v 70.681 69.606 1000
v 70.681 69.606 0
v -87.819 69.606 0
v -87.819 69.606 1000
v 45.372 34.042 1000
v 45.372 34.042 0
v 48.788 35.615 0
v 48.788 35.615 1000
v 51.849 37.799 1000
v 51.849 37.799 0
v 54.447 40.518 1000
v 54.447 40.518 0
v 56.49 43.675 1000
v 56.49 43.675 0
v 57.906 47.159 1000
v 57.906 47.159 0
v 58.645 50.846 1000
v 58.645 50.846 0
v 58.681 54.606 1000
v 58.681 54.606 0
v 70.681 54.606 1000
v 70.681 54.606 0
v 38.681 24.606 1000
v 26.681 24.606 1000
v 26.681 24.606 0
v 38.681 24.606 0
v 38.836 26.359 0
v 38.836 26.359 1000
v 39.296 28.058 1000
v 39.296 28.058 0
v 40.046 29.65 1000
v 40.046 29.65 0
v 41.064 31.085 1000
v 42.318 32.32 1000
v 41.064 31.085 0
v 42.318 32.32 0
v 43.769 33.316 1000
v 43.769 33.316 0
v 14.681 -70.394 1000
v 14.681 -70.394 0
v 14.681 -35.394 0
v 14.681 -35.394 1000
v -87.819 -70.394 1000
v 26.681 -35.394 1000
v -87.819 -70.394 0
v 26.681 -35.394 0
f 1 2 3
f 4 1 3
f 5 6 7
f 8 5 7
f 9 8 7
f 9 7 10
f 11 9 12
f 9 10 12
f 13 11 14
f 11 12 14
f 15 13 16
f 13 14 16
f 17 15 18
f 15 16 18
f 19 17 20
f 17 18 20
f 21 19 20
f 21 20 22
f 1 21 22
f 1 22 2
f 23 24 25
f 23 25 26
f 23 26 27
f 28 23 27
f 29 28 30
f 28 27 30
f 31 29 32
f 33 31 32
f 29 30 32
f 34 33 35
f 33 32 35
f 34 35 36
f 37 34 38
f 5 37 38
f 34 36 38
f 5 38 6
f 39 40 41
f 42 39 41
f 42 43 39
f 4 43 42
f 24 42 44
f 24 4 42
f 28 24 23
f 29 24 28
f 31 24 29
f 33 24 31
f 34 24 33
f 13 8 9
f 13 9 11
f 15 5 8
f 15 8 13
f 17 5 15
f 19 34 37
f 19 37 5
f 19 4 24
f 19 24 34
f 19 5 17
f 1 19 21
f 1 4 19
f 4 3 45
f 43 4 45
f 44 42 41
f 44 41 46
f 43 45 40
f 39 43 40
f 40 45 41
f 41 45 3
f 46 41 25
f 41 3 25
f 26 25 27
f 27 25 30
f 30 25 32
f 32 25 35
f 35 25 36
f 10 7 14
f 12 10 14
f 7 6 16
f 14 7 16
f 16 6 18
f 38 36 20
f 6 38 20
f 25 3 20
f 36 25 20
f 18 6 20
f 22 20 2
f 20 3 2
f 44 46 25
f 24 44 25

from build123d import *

# Parameters (mm, degrees)
F1_DEPTH = 1000


with BuildPart() as f1:
    # F0 (on Top) → F1 (new body)
    with BuildSketch(Plane.XY):
        with BuildLine():
            Line((70.681115, 69.605961), (-87.818885, 69.605961))
            Line((-87.818885, 69.605961), (-87.818885, -70.394039))
            Line((-87.818885, -70.394039), (14.681115, -70.394039))
            Line((14.681115, -70.394039), (14.681115, -35.394039))
            Line((14.681115, -35.394039), (26.681115, -35.394039))
            Line((26.681115, -35.394039), (26.681115, 24.605961))
            Line((26.681115, 24.605961), (38.681115, 24.605961))
            ThreePointArc((38.681115, 24.605961), (40.523457, 30.389785), (45.37164, 34.042453))
            ThreePointArc((45.37164, 34.042453), (55.542724, 42.048295), (58.681115, 54.605961))
            Line((58.681115, 54.605961), (70.681115, 54.605961))
            Line((70.681115, 54.605961), (70.681115, 69.605961))
        make_face()
    extrude(amount=F1_DEPTH)


solid = f1.part
